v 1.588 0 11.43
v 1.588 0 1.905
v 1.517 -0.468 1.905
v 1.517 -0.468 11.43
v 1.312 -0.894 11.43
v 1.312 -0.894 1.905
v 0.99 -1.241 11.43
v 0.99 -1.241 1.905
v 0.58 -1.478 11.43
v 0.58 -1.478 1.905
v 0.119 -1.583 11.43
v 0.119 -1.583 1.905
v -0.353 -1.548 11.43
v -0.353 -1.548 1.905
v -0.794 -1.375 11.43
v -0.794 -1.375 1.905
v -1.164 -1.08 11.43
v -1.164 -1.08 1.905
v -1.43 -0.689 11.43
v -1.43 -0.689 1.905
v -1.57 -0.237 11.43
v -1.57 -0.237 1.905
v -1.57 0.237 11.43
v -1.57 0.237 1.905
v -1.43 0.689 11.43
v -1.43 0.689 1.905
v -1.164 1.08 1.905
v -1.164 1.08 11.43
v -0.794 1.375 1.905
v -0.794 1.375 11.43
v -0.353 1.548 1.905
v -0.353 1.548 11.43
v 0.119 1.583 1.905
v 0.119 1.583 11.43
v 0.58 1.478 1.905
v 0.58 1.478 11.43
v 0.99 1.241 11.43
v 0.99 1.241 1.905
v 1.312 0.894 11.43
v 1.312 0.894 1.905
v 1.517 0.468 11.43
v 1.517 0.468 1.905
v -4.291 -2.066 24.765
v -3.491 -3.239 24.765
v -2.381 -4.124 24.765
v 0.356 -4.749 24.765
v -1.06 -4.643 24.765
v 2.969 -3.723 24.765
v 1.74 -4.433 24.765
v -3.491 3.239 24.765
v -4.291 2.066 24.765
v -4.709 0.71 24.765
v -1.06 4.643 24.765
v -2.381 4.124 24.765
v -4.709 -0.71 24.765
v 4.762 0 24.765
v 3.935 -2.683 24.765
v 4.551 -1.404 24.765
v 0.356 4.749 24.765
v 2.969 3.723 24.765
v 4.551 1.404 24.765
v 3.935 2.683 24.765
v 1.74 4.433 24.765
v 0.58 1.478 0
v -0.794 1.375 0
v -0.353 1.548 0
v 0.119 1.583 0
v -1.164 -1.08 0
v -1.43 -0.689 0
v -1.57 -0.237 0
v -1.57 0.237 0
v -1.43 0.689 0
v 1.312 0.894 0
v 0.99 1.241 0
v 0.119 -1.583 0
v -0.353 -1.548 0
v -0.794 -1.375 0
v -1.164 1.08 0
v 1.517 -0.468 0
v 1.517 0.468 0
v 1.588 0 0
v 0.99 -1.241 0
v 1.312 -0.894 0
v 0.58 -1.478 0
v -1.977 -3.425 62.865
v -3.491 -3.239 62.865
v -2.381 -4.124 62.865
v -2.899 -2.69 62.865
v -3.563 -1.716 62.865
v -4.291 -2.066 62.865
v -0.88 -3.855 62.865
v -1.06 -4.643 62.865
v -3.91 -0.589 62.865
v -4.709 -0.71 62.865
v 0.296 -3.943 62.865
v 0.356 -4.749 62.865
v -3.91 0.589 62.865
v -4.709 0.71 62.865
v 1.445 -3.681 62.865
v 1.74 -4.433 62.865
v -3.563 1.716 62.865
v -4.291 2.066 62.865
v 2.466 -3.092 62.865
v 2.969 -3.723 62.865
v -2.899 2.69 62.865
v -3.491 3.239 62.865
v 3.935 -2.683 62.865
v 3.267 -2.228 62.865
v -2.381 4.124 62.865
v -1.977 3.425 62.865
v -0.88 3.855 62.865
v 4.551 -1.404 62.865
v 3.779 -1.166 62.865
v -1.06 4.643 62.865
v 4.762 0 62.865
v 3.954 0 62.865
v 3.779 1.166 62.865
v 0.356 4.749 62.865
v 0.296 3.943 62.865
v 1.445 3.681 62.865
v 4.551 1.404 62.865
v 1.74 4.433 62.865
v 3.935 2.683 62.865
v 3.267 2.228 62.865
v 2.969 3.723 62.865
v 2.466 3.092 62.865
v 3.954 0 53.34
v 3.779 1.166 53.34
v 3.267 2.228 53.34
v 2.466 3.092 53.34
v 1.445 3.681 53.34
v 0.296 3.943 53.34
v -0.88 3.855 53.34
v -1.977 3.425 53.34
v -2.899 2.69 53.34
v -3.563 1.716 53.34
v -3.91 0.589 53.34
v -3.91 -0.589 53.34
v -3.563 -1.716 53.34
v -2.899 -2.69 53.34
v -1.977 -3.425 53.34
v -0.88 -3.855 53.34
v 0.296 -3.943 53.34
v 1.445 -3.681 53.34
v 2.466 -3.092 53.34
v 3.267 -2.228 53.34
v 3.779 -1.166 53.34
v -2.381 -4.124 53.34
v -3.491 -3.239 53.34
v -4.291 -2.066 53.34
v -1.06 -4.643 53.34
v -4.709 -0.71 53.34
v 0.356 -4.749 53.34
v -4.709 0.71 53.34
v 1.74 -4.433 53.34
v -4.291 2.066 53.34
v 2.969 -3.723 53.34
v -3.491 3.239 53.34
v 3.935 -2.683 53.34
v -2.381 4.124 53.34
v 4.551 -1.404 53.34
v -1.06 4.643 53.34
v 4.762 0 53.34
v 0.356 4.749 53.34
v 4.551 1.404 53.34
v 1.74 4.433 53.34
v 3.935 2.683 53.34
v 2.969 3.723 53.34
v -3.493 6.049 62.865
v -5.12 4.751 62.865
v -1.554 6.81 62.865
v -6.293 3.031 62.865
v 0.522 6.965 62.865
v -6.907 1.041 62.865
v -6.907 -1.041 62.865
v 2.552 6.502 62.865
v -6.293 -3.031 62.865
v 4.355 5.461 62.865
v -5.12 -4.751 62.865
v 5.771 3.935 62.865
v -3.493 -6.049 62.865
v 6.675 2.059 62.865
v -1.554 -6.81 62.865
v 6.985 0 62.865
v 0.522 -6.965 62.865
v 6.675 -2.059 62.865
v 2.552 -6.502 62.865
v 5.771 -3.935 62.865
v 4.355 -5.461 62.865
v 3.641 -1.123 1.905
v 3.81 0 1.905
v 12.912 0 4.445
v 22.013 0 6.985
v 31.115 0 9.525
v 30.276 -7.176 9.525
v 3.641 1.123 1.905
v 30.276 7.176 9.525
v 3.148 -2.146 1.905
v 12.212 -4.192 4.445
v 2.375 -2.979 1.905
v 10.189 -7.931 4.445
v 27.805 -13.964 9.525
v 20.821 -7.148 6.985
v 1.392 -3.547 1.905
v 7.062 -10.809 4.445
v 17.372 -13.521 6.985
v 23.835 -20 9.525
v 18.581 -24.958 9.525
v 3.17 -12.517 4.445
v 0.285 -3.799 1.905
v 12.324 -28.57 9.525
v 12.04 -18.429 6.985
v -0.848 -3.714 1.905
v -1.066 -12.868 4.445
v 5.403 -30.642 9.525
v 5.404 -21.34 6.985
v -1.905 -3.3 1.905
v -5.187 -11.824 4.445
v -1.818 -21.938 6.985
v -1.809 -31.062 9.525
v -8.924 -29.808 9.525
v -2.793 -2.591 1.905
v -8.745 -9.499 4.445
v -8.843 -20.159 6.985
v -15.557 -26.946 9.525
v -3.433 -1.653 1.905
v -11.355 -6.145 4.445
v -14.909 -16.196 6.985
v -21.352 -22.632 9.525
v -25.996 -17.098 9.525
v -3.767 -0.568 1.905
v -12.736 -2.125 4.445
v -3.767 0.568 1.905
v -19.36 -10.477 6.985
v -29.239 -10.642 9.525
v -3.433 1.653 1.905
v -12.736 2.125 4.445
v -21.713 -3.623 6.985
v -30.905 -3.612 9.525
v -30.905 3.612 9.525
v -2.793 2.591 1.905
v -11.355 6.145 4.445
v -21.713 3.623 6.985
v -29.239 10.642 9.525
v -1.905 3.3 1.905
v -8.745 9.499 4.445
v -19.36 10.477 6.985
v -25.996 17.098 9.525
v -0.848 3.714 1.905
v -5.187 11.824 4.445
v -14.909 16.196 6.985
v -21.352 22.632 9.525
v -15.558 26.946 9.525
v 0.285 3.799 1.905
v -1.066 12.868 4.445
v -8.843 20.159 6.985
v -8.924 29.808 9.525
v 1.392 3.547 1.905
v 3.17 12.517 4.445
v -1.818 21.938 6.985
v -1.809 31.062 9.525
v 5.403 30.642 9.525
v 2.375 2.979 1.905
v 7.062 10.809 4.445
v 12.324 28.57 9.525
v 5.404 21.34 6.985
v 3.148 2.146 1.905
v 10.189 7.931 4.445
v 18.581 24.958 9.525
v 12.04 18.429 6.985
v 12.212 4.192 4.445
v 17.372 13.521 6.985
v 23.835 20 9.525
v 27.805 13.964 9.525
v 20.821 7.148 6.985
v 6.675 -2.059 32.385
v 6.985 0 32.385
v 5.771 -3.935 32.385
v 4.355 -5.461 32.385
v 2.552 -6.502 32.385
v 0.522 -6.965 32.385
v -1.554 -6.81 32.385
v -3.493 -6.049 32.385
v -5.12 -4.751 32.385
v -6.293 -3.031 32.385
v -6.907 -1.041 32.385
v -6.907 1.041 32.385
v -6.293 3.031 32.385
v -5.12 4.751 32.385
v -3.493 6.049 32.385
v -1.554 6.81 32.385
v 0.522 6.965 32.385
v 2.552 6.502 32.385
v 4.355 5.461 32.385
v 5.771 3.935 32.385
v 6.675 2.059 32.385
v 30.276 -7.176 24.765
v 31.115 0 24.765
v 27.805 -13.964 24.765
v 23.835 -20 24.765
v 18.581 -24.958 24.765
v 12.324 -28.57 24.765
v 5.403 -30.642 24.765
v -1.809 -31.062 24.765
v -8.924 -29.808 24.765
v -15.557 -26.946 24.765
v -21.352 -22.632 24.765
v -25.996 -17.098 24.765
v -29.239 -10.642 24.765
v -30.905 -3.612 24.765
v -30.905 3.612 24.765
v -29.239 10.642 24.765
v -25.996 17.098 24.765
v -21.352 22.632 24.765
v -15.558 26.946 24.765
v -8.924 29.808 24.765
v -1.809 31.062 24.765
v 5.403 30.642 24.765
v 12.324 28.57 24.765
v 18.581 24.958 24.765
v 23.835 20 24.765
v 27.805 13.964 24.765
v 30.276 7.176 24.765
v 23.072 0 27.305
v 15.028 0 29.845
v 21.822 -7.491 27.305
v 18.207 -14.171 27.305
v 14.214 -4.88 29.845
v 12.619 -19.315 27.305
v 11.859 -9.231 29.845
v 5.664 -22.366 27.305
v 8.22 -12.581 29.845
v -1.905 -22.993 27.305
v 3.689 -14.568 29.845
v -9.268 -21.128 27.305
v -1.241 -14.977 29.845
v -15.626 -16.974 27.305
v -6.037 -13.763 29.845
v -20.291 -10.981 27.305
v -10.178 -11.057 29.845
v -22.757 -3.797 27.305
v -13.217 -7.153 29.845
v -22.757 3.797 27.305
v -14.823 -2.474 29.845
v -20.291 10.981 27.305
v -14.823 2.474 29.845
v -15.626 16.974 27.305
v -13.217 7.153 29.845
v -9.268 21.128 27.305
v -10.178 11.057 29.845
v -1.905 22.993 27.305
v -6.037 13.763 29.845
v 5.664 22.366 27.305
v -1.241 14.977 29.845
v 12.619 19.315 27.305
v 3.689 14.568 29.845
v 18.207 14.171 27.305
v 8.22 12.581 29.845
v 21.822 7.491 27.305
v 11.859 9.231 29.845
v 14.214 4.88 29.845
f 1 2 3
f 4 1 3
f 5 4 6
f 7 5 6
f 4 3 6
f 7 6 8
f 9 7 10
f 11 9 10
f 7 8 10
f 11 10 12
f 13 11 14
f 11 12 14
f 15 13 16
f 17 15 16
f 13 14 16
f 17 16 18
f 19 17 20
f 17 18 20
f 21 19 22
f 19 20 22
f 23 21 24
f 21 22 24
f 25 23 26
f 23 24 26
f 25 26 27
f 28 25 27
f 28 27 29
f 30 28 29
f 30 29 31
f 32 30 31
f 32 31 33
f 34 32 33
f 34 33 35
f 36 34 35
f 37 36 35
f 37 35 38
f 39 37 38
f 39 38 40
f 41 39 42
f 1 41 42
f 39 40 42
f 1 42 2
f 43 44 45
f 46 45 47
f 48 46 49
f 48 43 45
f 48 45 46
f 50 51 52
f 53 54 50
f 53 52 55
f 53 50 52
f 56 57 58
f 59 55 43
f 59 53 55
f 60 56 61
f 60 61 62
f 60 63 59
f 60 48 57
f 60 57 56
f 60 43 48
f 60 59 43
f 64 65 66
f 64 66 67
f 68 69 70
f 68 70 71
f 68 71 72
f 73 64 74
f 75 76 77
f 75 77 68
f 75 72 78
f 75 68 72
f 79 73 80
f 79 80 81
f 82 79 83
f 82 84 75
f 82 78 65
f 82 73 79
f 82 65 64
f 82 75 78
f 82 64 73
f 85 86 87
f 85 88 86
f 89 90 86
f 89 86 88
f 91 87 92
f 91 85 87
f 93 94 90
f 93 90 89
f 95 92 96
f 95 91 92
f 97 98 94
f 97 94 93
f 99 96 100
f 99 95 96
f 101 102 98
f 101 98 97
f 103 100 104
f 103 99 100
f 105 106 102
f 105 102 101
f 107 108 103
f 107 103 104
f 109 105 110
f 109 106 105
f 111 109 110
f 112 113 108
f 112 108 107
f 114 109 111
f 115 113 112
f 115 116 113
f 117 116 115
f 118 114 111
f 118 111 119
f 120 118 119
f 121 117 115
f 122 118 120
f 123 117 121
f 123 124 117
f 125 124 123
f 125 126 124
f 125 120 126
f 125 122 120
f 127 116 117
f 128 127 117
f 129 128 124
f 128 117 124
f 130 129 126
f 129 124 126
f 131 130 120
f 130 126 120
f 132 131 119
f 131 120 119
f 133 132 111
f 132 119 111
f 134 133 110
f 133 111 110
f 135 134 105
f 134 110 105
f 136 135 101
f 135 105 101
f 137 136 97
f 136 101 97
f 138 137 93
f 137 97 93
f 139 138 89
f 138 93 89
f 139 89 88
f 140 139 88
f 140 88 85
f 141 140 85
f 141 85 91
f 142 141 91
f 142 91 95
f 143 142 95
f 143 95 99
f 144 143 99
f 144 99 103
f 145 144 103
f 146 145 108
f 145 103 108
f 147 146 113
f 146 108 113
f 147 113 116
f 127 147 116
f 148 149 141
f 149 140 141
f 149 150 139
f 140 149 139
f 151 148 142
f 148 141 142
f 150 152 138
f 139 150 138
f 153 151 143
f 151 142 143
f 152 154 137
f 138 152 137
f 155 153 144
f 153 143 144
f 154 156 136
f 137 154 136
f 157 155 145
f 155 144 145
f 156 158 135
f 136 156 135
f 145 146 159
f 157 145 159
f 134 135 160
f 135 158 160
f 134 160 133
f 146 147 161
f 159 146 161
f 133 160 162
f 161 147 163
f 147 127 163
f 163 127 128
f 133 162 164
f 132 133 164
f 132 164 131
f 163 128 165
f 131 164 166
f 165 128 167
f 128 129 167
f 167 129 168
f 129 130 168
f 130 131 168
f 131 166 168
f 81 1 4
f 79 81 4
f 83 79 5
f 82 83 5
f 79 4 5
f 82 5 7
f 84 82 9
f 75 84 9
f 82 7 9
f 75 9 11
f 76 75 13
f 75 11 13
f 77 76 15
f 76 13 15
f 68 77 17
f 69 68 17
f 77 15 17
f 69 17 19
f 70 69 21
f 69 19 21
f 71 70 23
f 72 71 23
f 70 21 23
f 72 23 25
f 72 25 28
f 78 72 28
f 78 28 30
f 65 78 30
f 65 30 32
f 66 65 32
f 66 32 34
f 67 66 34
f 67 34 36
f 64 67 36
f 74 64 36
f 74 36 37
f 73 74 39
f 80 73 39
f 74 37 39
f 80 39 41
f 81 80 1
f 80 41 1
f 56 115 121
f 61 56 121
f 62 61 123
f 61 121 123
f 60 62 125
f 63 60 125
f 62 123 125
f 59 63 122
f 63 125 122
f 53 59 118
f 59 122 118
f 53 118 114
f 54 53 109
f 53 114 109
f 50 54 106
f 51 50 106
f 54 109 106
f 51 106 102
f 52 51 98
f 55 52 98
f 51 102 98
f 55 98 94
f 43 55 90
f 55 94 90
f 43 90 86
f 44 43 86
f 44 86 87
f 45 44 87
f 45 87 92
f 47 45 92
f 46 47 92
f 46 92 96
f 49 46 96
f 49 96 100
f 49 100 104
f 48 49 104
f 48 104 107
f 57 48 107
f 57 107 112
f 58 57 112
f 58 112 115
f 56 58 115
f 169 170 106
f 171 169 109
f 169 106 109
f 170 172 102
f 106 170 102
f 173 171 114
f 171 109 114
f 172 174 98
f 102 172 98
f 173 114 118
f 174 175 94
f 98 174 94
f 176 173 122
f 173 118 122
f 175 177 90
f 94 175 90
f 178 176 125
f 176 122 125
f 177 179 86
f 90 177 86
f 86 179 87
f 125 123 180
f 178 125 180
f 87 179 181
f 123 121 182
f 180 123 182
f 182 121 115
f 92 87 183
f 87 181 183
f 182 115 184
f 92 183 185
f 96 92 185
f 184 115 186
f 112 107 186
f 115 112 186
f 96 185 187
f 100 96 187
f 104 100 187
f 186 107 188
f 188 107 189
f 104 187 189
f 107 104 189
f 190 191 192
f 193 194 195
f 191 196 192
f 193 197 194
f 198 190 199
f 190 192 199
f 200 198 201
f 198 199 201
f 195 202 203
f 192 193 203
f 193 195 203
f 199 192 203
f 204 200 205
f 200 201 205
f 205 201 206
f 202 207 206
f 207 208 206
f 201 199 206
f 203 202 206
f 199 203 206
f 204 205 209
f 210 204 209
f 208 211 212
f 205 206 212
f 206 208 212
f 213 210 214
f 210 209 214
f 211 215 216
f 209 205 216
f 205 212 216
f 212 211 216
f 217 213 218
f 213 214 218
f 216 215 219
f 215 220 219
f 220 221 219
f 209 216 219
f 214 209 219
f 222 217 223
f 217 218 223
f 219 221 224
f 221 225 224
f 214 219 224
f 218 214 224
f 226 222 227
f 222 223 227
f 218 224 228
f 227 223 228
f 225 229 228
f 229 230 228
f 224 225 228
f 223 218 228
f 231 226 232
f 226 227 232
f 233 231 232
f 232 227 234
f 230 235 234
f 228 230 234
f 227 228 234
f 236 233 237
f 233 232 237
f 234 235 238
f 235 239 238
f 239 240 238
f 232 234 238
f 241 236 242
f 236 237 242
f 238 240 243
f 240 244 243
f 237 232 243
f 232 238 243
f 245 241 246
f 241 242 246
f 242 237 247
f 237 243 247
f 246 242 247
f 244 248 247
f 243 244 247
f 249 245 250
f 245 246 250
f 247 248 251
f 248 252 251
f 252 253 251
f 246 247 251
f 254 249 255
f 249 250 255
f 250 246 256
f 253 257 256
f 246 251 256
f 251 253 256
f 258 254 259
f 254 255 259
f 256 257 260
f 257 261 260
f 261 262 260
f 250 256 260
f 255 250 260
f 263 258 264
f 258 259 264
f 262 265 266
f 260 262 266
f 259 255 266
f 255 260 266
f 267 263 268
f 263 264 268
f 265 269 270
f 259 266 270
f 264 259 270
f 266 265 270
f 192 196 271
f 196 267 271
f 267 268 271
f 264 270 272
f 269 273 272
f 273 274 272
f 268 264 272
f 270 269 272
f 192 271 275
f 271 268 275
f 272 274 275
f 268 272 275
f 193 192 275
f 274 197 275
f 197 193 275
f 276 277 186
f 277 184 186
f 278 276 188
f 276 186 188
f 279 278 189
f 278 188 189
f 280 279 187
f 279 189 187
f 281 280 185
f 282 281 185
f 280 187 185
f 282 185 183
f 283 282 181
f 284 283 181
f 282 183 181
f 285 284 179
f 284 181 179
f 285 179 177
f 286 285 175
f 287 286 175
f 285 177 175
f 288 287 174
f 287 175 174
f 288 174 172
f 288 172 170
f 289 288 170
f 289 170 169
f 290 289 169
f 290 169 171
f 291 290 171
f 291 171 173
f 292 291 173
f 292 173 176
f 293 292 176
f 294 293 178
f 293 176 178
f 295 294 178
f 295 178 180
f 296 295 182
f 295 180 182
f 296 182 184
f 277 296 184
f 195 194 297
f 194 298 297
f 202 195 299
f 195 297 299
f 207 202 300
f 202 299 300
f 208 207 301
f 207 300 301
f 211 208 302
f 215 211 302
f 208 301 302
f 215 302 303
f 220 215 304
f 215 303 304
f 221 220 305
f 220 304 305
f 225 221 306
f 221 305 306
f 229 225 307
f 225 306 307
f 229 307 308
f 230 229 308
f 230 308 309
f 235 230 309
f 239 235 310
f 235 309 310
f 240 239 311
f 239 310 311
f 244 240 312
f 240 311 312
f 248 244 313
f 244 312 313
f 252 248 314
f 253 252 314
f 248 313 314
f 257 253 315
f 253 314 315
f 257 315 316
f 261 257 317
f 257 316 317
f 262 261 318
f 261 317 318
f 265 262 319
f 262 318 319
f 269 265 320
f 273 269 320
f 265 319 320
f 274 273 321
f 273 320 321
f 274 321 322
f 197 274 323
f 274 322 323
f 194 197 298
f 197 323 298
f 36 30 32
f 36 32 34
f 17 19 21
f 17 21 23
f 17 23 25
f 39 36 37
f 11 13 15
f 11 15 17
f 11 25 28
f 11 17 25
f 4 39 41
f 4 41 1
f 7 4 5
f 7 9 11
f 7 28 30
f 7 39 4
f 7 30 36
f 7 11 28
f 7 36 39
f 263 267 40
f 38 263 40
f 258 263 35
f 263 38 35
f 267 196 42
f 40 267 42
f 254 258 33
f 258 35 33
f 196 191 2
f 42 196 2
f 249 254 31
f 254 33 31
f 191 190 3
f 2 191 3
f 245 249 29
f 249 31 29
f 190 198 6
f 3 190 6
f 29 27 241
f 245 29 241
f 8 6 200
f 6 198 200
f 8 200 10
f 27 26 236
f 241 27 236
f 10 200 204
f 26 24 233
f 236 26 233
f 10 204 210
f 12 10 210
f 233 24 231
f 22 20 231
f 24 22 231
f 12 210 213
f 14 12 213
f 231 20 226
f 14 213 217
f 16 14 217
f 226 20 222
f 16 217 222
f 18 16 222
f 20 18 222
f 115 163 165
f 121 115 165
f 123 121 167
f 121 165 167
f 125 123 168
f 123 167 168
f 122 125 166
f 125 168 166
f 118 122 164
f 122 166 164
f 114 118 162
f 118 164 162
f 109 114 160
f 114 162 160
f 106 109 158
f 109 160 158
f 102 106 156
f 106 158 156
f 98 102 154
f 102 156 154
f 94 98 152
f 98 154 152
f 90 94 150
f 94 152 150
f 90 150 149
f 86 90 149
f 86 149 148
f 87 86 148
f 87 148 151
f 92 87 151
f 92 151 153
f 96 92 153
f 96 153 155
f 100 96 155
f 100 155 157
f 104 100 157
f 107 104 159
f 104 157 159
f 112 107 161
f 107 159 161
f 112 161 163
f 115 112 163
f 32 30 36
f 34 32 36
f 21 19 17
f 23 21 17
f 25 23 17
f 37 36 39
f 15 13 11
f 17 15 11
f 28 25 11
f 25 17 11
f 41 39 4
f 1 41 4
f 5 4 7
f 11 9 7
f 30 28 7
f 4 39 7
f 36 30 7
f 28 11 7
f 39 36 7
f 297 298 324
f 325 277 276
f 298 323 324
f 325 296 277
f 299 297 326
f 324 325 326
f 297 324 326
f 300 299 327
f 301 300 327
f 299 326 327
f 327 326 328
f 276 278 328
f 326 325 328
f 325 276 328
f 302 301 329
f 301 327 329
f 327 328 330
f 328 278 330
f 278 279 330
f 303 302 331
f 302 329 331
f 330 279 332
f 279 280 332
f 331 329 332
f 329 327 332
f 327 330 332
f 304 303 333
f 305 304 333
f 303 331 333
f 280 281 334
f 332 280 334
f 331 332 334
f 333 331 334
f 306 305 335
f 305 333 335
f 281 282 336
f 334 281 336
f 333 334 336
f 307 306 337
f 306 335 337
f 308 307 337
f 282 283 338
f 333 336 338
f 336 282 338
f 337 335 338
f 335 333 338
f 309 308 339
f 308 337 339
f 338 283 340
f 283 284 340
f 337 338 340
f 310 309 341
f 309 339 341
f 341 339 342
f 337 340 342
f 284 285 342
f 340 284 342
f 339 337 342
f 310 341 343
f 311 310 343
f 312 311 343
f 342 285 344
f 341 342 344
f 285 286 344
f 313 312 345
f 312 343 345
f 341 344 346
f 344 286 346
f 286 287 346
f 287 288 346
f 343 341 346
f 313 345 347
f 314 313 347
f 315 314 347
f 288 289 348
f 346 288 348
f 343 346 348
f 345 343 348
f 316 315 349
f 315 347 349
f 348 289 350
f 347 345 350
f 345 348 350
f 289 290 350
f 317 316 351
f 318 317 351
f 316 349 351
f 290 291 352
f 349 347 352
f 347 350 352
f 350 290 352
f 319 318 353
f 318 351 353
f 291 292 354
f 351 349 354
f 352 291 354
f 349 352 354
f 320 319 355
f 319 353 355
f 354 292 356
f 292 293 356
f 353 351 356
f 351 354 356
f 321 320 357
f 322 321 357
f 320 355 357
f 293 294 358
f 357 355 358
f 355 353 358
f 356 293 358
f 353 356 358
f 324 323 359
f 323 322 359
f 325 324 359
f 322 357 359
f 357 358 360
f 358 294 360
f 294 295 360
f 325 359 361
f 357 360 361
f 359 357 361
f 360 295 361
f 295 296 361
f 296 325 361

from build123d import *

# Parameters (mm, degrees)
F2_R      = 4.7625
F3_DEPTH  = 9.525
F4_R      = 1.5875
F5_DEPTH  = 9.525
F3_FACE_R = 4.7625
F6_DEPTH  = 9.525
F7_R      = 3.954416
F8_DEPTH  = 9.525
F5_FACE_R = 1.5875
F9_DEPTH  = 11.43
F10_DEPTH = 28.575


with BuildPart() as f1:
    # F0 (on Front) → F1 (revolve)
    with BuildSketch(Plane.XZ):
        Polygon((3.81, 1.905), (31.115, 9.525), (31.115, 24.765), (6.985, 32.385), (6.985, 62.865), (0, 62.865), (0, 1.905), align=None)
    revolve(axis=Axis((0, 0, 32.385), (0, 0, -1)))

    # F2 (on face) → F3 (cut)
    with BuildSketch(Plane.XY.offset(62.865)):
        Circle(F2_R)
    extrude(amount=-F3_DEPTH, mode=Mode.SUBTRACT)

    # F4 (on face) → F5 (cut)
    with BuildSketch(Plane(origin=(0, 0, 1.905), x_dir=(1, 0, 0), z_dir=(0, 0, -1))):
        Circle(F4_R)
    extrude(amount=-F5_DEPTH, mode=Mode.SUBTRACT)

    # F3_face (on face) → F10 (cut)
    with BuildSketch(Plane.XY.offset(53.34)):
        Circle(F3_FACE_R)
    extrude(amount=-F10_DEPTH, mode=Mode.SUBTRACT)


with BuildPart() as f6:
    # F3_face (on face) → F6 (new body)
    with BuildSketch(Plane.XY.offset(53.34)):
        Circle(F3_FACE_R)
    extrude(amount=F6_DEPTH)

    # F7 (on face) → F8 (cut)
    with BuildSketch(Plane.XY.offset(62.865)):
        Circle(F7_R)
    extrude(amount=-F8_DEPTH, mode=Mode.SUBTRACT)


with BuildPart() as f9:
    # F5_face (on face) → F9 (new body)
    with BuildSketch(Plane(origin=(0, 0, 11.43), x_dir=(1, 0, 0), z_dir=(0, 0, -1))):
        Circle(F5_FACE_R)
    extrude(amount=F9_DEPTH)


solid = Compound([f1.part, f6.part, f9.part])
